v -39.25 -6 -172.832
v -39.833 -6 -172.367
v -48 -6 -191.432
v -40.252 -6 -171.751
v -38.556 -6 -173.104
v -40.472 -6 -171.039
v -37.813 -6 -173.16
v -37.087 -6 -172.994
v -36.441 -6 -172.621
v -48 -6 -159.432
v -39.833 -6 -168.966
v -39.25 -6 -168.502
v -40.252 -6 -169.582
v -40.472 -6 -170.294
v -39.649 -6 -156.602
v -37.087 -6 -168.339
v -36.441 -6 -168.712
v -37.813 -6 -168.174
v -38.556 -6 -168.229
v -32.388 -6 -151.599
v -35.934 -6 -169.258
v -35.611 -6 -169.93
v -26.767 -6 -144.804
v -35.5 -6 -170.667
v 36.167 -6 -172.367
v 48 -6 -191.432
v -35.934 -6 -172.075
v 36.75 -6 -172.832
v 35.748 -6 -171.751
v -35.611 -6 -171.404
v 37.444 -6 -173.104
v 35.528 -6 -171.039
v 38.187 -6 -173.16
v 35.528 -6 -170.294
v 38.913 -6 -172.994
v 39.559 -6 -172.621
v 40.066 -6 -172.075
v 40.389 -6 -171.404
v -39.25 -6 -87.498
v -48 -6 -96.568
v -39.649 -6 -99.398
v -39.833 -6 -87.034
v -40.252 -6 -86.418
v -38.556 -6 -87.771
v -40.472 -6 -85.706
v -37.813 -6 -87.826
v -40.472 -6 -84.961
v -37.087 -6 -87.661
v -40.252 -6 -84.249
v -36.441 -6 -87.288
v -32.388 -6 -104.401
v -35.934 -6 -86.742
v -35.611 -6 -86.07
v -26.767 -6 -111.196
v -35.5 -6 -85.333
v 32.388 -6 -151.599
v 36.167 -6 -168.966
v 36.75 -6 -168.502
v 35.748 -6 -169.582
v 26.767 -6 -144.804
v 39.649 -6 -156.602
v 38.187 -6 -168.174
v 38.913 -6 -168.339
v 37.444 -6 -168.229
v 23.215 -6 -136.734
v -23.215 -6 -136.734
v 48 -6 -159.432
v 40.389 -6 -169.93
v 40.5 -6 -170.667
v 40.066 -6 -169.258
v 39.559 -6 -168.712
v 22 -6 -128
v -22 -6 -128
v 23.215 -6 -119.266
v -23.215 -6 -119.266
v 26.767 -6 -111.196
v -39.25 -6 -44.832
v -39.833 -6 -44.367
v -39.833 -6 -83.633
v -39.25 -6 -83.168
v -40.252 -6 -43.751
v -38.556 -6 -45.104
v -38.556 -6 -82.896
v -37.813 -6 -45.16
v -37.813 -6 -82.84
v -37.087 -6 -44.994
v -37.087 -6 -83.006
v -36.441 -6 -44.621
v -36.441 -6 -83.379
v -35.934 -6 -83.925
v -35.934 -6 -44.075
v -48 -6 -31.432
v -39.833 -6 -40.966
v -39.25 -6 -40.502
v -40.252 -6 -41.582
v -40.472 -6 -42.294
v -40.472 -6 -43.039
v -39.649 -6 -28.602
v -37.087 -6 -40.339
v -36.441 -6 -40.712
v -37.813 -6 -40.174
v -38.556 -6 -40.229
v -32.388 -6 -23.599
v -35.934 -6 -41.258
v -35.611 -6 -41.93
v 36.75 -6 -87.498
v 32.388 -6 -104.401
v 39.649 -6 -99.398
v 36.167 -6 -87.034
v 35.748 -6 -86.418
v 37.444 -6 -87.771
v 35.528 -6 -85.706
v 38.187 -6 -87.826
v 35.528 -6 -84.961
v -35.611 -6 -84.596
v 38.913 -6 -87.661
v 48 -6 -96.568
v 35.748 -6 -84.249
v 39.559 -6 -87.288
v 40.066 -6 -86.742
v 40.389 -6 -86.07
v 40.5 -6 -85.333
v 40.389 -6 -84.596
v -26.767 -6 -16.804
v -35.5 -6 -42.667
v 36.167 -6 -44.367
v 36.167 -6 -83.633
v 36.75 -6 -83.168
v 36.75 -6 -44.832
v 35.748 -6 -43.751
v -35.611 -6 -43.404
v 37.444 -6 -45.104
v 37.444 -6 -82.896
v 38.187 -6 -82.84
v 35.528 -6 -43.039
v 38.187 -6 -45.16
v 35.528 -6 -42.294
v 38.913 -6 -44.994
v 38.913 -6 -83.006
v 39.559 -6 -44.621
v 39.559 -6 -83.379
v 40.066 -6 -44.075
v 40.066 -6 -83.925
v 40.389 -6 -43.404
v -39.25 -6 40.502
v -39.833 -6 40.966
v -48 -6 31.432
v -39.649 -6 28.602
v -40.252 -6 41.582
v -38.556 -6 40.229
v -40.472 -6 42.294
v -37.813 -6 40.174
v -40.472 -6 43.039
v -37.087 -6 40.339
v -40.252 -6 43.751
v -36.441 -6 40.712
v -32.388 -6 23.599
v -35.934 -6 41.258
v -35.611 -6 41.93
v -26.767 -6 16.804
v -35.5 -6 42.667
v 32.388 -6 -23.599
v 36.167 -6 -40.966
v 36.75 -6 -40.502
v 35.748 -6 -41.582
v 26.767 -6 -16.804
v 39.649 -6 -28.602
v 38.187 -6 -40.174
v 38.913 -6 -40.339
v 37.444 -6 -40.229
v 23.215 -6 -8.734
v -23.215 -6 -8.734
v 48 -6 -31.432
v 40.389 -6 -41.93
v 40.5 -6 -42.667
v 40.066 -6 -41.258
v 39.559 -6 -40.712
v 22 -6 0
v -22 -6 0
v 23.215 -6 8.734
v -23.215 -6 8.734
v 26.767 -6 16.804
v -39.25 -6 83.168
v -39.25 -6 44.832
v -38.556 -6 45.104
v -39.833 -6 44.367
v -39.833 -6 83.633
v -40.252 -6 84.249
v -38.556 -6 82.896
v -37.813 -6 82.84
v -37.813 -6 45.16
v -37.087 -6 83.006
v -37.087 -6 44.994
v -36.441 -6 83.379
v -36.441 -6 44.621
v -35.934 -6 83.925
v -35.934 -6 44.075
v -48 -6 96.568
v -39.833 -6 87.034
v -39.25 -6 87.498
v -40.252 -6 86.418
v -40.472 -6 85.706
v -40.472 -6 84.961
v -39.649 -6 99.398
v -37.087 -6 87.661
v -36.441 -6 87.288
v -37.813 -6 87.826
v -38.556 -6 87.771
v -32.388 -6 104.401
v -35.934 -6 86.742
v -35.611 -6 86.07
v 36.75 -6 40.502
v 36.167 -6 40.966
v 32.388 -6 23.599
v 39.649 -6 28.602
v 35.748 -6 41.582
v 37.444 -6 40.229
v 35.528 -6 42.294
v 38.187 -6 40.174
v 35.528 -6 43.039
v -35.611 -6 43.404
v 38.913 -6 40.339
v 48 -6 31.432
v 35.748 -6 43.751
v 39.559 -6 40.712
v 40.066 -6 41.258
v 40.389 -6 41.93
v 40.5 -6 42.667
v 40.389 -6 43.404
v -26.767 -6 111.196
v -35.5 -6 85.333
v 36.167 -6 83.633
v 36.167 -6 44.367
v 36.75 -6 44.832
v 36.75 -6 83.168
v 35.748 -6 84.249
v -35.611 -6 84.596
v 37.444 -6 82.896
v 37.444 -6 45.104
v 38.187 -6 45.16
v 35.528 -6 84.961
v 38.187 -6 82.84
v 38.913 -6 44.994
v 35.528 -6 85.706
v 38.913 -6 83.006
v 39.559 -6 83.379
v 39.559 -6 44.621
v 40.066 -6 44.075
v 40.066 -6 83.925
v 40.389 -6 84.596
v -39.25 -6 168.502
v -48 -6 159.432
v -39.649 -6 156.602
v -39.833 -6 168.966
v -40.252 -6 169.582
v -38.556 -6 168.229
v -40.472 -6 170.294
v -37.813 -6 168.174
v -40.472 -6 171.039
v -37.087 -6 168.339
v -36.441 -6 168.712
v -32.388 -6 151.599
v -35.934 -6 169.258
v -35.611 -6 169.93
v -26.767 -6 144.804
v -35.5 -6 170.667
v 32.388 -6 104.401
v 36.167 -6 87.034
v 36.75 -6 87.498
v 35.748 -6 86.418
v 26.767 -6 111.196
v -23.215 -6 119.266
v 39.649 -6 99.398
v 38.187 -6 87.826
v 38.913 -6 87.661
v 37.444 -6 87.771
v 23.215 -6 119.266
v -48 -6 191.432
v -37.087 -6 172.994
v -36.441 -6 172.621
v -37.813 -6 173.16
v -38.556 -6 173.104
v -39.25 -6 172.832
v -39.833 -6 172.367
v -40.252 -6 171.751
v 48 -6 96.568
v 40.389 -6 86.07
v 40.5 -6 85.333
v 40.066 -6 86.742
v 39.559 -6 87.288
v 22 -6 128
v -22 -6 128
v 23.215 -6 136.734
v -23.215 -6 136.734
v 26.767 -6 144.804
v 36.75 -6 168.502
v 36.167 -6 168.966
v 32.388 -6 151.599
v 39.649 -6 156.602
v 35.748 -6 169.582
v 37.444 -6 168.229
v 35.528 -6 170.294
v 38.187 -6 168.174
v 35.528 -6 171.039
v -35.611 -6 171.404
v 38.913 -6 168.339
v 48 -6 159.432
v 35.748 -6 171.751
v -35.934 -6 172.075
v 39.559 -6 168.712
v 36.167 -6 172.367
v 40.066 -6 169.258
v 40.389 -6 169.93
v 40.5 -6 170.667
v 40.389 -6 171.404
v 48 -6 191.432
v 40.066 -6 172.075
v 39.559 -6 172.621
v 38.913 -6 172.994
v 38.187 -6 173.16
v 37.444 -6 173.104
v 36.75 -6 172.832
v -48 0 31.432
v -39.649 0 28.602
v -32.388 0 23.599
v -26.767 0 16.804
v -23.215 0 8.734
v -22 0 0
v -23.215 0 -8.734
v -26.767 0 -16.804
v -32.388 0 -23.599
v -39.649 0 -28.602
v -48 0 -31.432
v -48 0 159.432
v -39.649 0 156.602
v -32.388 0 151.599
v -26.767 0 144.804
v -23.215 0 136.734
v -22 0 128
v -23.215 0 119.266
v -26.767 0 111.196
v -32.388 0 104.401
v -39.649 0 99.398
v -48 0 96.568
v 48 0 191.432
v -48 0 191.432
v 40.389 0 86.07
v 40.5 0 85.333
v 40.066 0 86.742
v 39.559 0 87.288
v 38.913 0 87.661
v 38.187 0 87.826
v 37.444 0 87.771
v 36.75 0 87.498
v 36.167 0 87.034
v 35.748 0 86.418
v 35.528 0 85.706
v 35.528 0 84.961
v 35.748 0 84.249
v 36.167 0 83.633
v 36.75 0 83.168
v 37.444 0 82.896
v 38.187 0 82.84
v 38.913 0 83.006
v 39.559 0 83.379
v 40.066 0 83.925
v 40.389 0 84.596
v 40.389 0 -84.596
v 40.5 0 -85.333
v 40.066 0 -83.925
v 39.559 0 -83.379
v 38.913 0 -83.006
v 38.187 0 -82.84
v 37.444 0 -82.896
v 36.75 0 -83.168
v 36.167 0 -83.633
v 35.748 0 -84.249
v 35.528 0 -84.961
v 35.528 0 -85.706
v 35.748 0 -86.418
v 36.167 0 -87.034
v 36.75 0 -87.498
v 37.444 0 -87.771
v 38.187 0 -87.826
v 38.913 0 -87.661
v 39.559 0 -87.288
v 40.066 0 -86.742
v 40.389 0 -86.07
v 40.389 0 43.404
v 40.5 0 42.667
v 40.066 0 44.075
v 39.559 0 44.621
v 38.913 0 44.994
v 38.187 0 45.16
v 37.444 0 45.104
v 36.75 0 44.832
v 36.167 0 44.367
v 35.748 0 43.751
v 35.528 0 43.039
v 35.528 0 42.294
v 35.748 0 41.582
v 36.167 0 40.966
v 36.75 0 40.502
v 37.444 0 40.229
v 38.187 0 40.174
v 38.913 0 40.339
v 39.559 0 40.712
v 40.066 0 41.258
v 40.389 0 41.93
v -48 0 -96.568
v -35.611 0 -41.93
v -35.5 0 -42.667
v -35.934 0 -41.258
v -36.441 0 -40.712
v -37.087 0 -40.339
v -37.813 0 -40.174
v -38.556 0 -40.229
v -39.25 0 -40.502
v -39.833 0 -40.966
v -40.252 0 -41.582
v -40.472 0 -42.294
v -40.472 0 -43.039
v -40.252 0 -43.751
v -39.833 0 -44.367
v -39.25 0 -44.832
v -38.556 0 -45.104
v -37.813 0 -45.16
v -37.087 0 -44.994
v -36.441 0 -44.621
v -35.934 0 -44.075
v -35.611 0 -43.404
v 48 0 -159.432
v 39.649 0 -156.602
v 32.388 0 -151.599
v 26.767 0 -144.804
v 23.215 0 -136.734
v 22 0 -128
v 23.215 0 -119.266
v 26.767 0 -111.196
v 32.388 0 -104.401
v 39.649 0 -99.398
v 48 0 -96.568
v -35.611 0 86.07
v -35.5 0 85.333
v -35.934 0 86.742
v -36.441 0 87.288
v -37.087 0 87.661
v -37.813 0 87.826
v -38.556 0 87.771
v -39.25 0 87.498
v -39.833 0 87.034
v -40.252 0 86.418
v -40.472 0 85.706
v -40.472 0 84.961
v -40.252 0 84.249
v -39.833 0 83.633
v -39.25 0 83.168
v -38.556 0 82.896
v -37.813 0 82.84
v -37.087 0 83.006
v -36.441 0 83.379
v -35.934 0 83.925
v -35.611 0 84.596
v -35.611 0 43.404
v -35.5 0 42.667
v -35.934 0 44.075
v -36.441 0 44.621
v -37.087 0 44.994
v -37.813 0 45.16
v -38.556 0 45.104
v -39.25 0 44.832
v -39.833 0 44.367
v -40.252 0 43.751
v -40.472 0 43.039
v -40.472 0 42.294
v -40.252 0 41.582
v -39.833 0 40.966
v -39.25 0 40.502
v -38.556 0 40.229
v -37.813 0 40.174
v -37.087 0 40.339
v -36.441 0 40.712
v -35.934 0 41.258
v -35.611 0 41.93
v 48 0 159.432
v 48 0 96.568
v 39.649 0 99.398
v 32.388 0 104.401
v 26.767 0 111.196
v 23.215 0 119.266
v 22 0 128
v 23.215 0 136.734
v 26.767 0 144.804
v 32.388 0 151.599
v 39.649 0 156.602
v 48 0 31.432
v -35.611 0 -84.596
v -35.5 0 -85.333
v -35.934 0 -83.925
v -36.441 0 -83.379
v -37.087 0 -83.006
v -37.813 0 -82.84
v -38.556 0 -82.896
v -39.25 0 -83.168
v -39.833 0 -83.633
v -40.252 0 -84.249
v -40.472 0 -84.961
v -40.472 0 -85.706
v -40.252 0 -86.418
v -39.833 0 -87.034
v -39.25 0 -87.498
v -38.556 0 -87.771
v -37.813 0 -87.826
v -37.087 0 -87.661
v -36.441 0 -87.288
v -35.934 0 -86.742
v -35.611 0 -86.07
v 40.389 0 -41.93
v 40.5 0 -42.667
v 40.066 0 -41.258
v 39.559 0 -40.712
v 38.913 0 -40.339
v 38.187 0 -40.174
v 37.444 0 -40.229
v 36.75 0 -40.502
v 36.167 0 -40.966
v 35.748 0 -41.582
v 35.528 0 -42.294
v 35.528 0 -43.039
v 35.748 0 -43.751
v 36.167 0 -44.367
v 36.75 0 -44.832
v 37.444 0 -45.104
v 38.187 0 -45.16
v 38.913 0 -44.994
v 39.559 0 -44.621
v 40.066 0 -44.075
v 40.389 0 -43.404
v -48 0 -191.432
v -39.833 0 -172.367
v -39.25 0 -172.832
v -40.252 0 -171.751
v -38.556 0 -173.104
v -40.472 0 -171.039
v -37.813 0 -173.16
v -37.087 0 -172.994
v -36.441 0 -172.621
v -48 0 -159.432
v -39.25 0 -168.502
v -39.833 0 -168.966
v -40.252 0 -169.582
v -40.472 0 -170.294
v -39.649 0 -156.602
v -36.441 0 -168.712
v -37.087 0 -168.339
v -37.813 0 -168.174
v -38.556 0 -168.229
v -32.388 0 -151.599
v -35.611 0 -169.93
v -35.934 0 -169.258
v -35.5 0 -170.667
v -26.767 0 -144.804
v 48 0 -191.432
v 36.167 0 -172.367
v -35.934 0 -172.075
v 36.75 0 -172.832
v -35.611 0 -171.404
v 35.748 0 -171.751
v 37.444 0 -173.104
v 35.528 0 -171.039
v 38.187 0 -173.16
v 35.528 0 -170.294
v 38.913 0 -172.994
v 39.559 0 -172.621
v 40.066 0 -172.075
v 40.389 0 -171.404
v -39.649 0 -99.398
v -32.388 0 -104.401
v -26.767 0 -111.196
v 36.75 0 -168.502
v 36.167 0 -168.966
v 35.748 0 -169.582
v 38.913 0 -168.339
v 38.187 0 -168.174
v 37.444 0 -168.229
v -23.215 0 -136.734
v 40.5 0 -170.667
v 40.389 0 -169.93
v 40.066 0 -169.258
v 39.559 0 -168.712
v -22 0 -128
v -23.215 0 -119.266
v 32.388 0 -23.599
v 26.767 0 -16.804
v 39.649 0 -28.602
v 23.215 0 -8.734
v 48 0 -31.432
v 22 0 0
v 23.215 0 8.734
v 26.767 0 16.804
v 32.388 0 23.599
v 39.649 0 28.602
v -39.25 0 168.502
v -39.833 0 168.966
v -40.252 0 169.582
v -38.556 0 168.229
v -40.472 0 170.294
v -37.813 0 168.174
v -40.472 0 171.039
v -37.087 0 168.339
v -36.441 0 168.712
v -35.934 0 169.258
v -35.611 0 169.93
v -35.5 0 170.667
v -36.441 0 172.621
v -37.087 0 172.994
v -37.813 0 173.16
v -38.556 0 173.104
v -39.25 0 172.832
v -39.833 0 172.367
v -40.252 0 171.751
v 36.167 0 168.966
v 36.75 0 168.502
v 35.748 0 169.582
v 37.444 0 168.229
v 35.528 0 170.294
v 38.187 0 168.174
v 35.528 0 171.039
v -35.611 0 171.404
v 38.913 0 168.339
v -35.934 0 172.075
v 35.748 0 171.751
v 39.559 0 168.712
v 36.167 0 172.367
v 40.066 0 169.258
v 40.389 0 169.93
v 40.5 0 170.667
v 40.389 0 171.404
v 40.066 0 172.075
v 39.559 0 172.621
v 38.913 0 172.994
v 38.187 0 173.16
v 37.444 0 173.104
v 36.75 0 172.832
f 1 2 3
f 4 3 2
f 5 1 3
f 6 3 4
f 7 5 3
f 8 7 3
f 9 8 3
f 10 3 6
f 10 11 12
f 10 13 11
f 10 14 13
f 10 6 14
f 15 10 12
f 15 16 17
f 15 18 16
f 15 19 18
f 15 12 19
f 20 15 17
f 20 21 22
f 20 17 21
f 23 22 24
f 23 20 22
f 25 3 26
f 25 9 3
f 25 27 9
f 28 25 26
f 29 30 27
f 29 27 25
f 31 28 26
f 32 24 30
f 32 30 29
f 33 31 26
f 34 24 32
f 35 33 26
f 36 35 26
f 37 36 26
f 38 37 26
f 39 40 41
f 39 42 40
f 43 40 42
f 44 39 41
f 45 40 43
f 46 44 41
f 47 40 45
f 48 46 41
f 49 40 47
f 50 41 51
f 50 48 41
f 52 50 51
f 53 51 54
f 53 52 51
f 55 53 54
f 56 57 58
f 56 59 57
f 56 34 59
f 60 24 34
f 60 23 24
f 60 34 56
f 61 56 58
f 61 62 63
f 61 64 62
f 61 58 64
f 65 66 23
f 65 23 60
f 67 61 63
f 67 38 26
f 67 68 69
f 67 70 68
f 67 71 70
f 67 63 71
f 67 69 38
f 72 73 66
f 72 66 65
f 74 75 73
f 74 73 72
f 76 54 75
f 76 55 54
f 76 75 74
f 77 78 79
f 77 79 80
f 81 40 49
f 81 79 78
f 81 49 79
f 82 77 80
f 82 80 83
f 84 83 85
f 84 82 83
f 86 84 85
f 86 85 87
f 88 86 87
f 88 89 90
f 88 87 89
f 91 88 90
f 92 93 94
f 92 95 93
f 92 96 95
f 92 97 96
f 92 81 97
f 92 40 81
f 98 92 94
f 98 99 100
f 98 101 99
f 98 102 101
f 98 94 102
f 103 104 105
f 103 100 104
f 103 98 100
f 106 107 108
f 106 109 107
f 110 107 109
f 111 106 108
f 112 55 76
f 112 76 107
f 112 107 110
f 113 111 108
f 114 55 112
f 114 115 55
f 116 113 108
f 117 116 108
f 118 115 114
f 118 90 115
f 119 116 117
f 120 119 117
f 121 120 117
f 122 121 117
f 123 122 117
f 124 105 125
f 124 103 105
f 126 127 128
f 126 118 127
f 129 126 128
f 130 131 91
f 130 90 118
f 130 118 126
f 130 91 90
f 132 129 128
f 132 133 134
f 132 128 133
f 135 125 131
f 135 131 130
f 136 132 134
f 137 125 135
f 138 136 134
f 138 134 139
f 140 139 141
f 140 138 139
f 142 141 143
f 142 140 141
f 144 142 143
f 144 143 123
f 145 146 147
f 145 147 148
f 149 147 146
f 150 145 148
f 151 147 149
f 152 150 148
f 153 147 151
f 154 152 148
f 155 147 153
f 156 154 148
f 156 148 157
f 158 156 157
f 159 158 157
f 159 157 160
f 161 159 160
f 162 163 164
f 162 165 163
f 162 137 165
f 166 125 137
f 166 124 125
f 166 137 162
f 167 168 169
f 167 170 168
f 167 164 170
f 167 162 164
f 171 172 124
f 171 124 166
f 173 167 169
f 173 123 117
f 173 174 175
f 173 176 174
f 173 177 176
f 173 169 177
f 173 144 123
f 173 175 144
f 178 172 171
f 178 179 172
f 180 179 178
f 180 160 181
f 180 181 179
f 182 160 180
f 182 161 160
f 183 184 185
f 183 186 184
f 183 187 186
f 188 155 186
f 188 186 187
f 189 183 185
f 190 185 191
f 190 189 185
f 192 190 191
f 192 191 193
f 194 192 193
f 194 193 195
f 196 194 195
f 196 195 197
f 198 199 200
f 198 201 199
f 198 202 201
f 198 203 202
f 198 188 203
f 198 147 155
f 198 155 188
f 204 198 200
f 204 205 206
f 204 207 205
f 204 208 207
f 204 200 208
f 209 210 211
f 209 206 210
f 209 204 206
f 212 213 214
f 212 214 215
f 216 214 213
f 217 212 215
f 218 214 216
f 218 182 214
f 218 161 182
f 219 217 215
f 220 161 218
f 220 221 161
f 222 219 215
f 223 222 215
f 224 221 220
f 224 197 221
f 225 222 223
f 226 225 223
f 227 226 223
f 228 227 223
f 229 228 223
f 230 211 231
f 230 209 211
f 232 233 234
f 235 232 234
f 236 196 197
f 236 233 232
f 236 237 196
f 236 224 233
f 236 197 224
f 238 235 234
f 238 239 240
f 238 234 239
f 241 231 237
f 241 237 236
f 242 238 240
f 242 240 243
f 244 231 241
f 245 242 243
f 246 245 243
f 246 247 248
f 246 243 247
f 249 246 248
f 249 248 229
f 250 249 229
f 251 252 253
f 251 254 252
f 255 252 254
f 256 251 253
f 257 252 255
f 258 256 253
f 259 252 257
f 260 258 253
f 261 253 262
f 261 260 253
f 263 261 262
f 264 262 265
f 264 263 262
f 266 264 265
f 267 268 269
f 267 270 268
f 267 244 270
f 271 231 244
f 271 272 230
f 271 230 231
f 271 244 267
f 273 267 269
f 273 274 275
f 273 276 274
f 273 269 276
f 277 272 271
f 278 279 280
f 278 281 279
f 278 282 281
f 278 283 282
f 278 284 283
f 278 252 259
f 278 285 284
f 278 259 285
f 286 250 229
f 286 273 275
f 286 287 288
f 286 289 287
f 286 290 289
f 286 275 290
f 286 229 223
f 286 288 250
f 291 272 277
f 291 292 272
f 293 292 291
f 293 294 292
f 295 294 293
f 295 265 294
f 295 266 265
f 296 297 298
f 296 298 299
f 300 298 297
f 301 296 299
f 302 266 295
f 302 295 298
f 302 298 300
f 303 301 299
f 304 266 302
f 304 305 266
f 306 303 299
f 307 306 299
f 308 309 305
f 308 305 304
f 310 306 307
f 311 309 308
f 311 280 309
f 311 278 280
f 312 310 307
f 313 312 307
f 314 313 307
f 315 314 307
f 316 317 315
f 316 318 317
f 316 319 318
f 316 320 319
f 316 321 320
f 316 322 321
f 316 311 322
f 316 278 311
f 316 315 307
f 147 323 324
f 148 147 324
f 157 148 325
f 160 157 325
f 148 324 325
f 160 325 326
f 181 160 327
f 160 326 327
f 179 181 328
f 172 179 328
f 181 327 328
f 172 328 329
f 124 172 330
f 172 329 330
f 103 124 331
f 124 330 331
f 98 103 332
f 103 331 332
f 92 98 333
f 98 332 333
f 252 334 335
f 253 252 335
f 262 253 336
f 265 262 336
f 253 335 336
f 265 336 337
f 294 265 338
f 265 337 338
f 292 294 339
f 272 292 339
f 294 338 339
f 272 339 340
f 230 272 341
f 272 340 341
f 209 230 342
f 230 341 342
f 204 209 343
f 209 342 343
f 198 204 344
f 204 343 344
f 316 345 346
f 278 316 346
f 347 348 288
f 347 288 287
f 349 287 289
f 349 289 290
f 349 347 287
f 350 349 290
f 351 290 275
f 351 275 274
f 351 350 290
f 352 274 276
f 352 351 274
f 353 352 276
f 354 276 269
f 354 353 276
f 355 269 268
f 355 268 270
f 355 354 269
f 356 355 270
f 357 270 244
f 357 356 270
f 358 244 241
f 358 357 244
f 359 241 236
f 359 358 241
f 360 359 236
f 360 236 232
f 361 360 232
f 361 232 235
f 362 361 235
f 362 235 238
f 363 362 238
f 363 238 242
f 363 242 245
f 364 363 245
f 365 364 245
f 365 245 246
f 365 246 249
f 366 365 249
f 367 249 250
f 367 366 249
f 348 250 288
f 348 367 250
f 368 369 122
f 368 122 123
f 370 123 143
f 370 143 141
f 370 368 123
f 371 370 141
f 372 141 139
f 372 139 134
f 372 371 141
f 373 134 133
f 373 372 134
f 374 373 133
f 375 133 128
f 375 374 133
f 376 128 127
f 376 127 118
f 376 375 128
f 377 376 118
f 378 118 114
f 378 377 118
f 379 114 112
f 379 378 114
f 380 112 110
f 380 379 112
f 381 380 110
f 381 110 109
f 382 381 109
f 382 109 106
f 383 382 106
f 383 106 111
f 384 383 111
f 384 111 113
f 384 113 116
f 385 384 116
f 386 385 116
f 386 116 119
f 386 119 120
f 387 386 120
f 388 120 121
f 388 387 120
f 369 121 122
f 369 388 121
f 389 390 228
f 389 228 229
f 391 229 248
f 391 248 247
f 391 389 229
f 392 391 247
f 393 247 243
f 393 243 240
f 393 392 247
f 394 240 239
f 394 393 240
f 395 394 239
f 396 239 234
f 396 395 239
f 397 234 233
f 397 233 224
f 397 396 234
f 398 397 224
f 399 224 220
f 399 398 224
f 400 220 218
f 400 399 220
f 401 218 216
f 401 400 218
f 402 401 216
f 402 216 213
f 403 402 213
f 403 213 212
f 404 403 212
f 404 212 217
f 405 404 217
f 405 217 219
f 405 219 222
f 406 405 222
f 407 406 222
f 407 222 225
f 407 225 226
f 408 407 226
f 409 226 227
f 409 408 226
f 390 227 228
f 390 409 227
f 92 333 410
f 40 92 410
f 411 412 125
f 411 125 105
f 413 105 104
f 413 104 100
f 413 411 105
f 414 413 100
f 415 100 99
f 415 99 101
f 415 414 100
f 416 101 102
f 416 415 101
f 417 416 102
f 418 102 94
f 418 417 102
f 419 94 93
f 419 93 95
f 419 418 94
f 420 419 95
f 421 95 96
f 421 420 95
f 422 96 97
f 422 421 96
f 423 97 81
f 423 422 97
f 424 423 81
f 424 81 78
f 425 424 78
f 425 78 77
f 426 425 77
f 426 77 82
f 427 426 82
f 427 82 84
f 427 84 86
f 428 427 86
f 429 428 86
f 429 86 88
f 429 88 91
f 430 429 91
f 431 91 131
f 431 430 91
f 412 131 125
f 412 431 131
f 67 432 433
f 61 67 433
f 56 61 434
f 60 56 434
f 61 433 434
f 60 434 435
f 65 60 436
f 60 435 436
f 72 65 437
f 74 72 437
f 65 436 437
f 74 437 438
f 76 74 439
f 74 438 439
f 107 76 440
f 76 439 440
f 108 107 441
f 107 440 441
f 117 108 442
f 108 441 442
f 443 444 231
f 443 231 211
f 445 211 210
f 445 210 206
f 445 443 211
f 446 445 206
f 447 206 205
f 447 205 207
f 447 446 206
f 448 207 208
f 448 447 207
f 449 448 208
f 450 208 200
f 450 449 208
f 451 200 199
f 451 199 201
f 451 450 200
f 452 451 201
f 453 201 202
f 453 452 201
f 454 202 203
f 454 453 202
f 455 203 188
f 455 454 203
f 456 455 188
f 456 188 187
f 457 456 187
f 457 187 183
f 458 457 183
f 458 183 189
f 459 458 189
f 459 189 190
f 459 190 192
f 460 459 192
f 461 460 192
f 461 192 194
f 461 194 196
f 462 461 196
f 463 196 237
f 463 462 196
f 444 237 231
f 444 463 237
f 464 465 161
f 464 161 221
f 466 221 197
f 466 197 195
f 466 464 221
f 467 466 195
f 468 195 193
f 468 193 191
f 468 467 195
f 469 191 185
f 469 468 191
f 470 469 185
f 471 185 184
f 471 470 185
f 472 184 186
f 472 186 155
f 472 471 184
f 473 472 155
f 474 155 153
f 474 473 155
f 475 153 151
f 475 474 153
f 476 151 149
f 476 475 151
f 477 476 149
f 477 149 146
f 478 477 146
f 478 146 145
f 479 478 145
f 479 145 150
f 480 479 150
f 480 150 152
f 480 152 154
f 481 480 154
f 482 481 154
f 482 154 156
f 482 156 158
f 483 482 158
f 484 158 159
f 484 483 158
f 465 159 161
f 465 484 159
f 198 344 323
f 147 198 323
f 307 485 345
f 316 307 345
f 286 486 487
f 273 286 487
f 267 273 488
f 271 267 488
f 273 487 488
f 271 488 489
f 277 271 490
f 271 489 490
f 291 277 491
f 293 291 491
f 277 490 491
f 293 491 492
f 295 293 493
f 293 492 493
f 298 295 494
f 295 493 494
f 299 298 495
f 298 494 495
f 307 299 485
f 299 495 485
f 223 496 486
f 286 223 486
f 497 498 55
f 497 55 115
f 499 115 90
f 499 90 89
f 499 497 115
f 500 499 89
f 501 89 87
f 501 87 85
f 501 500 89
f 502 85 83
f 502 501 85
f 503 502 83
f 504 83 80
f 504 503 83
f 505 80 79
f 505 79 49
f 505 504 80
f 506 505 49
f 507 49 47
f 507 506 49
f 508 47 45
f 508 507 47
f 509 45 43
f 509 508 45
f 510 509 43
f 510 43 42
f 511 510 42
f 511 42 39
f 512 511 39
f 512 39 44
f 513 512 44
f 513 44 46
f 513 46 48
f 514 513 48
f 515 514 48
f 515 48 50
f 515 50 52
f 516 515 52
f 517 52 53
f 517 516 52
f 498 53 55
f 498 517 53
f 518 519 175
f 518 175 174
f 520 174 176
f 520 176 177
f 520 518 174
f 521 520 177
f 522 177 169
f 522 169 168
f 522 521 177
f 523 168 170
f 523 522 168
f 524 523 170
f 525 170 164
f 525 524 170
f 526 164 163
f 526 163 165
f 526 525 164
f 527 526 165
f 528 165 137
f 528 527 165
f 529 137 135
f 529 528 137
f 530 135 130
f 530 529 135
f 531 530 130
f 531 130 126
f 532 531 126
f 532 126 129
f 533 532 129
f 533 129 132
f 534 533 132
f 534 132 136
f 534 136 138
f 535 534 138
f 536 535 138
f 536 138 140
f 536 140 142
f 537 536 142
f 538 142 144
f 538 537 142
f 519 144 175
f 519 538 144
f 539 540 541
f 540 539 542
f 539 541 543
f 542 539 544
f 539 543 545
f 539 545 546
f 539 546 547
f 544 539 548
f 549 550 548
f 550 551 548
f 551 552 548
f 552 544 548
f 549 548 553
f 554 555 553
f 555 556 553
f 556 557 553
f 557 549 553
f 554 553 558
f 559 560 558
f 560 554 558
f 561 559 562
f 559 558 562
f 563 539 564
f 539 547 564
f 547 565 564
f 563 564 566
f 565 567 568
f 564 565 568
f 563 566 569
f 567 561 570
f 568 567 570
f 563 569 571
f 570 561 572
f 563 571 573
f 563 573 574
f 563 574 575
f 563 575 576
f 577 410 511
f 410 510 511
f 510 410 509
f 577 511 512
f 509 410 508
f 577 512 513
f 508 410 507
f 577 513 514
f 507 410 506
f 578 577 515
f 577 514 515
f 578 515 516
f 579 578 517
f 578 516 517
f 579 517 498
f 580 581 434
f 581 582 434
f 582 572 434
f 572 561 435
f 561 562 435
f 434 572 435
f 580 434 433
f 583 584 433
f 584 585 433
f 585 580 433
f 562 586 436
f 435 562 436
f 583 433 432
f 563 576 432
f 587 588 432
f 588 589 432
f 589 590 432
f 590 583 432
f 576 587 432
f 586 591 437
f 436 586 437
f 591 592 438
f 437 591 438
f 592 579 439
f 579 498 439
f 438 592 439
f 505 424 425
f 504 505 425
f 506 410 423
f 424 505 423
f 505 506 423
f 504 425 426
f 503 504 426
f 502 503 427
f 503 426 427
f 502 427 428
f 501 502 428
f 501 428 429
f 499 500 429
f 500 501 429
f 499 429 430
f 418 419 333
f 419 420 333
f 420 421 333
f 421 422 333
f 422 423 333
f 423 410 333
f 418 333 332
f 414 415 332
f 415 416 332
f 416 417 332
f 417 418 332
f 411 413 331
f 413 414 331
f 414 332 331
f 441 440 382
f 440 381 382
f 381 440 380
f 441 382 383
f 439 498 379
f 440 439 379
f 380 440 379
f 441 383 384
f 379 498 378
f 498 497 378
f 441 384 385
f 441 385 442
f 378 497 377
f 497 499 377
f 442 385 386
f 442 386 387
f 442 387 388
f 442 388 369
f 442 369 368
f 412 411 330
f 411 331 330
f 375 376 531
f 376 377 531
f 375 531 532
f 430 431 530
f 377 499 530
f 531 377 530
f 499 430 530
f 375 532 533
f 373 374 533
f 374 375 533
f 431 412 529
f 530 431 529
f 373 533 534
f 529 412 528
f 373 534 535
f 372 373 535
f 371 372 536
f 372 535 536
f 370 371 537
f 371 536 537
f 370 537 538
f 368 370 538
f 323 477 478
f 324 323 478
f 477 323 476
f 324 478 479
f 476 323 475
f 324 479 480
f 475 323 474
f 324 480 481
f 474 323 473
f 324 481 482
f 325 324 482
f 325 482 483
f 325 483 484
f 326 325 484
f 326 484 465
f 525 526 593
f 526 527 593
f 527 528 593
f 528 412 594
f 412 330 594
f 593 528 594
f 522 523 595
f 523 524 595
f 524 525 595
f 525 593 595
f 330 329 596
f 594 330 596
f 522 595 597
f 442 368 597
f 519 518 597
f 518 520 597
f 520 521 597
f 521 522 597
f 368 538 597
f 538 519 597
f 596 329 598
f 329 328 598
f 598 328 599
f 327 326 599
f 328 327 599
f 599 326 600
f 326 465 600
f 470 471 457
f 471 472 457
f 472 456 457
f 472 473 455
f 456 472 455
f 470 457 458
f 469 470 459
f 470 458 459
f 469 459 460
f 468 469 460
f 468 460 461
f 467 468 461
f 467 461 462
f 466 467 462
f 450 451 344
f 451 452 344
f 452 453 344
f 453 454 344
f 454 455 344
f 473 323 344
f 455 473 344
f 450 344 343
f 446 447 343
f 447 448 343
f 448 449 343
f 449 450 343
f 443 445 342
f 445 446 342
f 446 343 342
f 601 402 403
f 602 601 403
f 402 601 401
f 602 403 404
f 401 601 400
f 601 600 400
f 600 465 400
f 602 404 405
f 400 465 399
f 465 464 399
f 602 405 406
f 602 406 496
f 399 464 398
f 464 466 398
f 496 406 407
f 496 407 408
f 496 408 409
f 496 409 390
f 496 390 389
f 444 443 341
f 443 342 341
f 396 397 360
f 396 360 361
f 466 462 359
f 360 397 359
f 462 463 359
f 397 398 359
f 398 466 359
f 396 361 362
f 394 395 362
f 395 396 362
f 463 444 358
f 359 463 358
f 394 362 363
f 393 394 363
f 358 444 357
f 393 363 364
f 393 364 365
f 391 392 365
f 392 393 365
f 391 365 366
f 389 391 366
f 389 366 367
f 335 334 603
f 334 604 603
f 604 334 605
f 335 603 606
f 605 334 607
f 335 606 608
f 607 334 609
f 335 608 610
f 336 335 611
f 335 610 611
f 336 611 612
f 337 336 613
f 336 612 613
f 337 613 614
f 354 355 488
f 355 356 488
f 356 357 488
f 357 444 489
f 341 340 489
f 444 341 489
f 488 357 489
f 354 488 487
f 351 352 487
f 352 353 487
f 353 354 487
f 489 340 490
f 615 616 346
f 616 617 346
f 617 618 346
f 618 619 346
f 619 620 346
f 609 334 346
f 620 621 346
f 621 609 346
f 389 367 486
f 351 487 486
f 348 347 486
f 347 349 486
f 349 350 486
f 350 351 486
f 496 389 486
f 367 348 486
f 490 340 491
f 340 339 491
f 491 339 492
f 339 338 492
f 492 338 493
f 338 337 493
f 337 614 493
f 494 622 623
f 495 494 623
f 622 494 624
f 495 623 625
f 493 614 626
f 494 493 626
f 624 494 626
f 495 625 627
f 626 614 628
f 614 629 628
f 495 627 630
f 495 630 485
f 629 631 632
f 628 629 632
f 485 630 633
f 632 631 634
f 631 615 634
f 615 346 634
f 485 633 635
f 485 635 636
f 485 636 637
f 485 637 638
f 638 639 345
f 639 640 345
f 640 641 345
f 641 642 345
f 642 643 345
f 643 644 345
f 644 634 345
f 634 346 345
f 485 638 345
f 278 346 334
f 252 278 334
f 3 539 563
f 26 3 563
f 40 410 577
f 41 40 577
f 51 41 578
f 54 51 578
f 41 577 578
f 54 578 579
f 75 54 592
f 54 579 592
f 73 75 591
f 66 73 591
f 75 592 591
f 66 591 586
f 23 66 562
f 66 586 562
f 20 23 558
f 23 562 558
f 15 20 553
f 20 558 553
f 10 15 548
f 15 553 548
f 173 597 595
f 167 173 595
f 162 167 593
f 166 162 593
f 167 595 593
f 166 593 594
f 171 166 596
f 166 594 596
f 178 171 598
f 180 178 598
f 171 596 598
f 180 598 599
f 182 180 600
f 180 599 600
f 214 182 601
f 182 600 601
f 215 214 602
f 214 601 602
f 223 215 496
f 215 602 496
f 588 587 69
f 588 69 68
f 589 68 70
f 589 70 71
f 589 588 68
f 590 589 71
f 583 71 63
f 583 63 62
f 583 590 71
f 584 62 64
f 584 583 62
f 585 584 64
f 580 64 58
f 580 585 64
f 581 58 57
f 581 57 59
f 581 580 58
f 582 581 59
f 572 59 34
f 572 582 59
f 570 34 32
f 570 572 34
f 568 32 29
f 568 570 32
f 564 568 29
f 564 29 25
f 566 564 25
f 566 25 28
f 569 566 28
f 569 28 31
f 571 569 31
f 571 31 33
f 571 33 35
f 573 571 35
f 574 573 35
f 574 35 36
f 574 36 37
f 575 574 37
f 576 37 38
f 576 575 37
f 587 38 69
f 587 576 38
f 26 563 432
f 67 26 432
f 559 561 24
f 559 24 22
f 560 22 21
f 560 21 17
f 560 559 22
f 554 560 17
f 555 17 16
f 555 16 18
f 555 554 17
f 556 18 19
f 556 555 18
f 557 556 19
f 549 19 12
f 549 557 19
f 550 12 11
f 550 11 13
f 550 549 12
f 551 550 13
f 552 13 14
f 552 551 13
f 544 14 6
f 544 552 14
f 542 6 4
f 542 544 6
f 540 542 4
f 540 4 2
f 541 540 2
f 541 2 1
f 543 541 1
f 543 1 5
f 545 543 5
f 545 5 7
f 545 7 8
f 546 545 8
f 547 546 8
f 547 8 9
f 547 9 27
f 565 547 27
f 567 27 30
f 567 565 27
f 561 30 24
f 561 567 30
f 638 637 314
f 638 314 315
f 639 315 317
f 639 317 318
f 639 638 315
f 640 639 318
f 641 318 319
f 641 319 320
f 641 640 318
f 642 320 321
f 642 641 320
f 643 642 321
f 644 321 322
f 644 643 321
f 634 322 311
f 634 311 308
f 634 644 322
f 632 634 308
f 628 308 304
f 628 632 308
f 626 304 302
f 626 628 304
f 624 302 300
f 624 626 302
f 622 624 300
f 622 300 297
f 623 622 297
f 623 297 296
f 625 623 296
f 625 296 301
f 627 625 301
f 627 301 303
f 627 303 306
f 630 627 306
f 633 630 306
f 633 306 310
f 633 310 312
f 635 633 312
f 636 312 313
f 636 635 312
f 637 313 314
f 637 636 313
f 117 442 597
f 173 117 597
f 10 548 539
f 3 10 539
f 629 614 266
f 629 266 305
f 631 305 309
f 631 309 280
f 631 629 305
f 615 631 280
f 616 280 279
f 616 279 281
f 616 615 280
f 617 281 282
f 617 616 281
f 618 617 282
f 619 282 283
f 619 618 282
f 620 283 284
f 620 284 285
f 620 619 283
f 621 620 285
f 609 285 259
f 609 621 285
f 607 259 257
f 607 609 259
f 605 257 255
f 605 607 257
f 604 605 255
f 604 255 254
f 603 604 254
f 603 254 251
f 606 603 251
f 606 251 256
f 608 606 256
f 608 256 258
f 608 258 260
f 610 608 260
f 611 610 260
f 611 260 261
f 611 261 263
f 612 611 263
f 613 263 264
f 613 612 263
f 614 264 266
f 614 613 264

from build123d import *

# Parameters (mm, degrees)
F1_R     = 2.5
F2_DEPTH = 6


with BuildPart() as f2:
    # F1 (on Front) → F2 (new body)
    with BuildSketch(Plane.XZ):
        with BuildLine():
            ThreePointArc((-48, -96.567533), (-22, -128), (-48, -159.432467))
            Line((-48, -159.432467), (-48, -191.432467))
            Line((-48, -191.432467), (48, -191.432467))
            Line((48, -191.432467), (48, -159.432467))
            ThreePointArc((48, -159.432467), (22, -128), (48, -96.567533))
            Line((48, -96.567533), (48, -31.432467))
            ThreePointArc((48, -31.432467), (22, 0), (48, 31.432467))
            Line((48, 31.432467), (48, 96.567533))
            ThreePointArc((48, 96.567533), (22, 128), (48, 159.432467))
            Line((48, 159.432467), (48, 191.432467))
            Line((48, 191.432467), (-48, 191.432467))
            Line((-48, 191.432467), (-48, 159.432467))
            ThreePointArc((-48, 159.432467), (-22, 128), (-48, 96.567533))
            Line((-48, 96.567533), (-48, 31.432467))
            ThreePointArc((-48, 31.432467), (-22, 0), (-48, -31.432467))
            Line((-48, -31.432467), (-48, -96.567533))
        make_face()
        with Locations((-38, -170.666667)):
            Circle(F1_R, mode=Mode.SUBTRACT)
        with Locations((-38, -85.333333)):
            Circle(F1_R, mode=Mode.SUBTRACT)
        with Locations((-38, -42.666667)):
            Circle(F1_R, mode=Mode.SUBTRACT)
        with Locations((38, -170.666667)):
            Circle(F1_R, mode=Mode.SUBTRACT)
        with Locations((38, -85.333333)):
            Circle(F1_R, mode=Mode.SUBTRACT)
        with Locations((38, -42.666667)):
            Circle(F1_R, mode=Mode.SUBTRACT)
        with Locations((-38, 42.666667)):
            Circle(F1_R, mode=Mode.SUBTRACT)
        with Locations((-38, 85.333333)):
            Circle(F1_R, mode=Mode.SUBTRACT)
        with Locations((-38, 170.666667)):
            Circle(F1_R, mode=Mode.SUBTRACT)
        with Locations((38, 42.666667)):
            Circle(F1_R, mode=Mode.SUBTRACT)
        with Locations((38, 85.333333)):
            Circle(F1_R, mode=Mode.SUBTRACT)
        with Locations((38, 170.666667)):
            Circle(F1_R, mode=Mode.SUBTRACT)
    extrude(amount=F2_DEPTH)


solid = f2.part
